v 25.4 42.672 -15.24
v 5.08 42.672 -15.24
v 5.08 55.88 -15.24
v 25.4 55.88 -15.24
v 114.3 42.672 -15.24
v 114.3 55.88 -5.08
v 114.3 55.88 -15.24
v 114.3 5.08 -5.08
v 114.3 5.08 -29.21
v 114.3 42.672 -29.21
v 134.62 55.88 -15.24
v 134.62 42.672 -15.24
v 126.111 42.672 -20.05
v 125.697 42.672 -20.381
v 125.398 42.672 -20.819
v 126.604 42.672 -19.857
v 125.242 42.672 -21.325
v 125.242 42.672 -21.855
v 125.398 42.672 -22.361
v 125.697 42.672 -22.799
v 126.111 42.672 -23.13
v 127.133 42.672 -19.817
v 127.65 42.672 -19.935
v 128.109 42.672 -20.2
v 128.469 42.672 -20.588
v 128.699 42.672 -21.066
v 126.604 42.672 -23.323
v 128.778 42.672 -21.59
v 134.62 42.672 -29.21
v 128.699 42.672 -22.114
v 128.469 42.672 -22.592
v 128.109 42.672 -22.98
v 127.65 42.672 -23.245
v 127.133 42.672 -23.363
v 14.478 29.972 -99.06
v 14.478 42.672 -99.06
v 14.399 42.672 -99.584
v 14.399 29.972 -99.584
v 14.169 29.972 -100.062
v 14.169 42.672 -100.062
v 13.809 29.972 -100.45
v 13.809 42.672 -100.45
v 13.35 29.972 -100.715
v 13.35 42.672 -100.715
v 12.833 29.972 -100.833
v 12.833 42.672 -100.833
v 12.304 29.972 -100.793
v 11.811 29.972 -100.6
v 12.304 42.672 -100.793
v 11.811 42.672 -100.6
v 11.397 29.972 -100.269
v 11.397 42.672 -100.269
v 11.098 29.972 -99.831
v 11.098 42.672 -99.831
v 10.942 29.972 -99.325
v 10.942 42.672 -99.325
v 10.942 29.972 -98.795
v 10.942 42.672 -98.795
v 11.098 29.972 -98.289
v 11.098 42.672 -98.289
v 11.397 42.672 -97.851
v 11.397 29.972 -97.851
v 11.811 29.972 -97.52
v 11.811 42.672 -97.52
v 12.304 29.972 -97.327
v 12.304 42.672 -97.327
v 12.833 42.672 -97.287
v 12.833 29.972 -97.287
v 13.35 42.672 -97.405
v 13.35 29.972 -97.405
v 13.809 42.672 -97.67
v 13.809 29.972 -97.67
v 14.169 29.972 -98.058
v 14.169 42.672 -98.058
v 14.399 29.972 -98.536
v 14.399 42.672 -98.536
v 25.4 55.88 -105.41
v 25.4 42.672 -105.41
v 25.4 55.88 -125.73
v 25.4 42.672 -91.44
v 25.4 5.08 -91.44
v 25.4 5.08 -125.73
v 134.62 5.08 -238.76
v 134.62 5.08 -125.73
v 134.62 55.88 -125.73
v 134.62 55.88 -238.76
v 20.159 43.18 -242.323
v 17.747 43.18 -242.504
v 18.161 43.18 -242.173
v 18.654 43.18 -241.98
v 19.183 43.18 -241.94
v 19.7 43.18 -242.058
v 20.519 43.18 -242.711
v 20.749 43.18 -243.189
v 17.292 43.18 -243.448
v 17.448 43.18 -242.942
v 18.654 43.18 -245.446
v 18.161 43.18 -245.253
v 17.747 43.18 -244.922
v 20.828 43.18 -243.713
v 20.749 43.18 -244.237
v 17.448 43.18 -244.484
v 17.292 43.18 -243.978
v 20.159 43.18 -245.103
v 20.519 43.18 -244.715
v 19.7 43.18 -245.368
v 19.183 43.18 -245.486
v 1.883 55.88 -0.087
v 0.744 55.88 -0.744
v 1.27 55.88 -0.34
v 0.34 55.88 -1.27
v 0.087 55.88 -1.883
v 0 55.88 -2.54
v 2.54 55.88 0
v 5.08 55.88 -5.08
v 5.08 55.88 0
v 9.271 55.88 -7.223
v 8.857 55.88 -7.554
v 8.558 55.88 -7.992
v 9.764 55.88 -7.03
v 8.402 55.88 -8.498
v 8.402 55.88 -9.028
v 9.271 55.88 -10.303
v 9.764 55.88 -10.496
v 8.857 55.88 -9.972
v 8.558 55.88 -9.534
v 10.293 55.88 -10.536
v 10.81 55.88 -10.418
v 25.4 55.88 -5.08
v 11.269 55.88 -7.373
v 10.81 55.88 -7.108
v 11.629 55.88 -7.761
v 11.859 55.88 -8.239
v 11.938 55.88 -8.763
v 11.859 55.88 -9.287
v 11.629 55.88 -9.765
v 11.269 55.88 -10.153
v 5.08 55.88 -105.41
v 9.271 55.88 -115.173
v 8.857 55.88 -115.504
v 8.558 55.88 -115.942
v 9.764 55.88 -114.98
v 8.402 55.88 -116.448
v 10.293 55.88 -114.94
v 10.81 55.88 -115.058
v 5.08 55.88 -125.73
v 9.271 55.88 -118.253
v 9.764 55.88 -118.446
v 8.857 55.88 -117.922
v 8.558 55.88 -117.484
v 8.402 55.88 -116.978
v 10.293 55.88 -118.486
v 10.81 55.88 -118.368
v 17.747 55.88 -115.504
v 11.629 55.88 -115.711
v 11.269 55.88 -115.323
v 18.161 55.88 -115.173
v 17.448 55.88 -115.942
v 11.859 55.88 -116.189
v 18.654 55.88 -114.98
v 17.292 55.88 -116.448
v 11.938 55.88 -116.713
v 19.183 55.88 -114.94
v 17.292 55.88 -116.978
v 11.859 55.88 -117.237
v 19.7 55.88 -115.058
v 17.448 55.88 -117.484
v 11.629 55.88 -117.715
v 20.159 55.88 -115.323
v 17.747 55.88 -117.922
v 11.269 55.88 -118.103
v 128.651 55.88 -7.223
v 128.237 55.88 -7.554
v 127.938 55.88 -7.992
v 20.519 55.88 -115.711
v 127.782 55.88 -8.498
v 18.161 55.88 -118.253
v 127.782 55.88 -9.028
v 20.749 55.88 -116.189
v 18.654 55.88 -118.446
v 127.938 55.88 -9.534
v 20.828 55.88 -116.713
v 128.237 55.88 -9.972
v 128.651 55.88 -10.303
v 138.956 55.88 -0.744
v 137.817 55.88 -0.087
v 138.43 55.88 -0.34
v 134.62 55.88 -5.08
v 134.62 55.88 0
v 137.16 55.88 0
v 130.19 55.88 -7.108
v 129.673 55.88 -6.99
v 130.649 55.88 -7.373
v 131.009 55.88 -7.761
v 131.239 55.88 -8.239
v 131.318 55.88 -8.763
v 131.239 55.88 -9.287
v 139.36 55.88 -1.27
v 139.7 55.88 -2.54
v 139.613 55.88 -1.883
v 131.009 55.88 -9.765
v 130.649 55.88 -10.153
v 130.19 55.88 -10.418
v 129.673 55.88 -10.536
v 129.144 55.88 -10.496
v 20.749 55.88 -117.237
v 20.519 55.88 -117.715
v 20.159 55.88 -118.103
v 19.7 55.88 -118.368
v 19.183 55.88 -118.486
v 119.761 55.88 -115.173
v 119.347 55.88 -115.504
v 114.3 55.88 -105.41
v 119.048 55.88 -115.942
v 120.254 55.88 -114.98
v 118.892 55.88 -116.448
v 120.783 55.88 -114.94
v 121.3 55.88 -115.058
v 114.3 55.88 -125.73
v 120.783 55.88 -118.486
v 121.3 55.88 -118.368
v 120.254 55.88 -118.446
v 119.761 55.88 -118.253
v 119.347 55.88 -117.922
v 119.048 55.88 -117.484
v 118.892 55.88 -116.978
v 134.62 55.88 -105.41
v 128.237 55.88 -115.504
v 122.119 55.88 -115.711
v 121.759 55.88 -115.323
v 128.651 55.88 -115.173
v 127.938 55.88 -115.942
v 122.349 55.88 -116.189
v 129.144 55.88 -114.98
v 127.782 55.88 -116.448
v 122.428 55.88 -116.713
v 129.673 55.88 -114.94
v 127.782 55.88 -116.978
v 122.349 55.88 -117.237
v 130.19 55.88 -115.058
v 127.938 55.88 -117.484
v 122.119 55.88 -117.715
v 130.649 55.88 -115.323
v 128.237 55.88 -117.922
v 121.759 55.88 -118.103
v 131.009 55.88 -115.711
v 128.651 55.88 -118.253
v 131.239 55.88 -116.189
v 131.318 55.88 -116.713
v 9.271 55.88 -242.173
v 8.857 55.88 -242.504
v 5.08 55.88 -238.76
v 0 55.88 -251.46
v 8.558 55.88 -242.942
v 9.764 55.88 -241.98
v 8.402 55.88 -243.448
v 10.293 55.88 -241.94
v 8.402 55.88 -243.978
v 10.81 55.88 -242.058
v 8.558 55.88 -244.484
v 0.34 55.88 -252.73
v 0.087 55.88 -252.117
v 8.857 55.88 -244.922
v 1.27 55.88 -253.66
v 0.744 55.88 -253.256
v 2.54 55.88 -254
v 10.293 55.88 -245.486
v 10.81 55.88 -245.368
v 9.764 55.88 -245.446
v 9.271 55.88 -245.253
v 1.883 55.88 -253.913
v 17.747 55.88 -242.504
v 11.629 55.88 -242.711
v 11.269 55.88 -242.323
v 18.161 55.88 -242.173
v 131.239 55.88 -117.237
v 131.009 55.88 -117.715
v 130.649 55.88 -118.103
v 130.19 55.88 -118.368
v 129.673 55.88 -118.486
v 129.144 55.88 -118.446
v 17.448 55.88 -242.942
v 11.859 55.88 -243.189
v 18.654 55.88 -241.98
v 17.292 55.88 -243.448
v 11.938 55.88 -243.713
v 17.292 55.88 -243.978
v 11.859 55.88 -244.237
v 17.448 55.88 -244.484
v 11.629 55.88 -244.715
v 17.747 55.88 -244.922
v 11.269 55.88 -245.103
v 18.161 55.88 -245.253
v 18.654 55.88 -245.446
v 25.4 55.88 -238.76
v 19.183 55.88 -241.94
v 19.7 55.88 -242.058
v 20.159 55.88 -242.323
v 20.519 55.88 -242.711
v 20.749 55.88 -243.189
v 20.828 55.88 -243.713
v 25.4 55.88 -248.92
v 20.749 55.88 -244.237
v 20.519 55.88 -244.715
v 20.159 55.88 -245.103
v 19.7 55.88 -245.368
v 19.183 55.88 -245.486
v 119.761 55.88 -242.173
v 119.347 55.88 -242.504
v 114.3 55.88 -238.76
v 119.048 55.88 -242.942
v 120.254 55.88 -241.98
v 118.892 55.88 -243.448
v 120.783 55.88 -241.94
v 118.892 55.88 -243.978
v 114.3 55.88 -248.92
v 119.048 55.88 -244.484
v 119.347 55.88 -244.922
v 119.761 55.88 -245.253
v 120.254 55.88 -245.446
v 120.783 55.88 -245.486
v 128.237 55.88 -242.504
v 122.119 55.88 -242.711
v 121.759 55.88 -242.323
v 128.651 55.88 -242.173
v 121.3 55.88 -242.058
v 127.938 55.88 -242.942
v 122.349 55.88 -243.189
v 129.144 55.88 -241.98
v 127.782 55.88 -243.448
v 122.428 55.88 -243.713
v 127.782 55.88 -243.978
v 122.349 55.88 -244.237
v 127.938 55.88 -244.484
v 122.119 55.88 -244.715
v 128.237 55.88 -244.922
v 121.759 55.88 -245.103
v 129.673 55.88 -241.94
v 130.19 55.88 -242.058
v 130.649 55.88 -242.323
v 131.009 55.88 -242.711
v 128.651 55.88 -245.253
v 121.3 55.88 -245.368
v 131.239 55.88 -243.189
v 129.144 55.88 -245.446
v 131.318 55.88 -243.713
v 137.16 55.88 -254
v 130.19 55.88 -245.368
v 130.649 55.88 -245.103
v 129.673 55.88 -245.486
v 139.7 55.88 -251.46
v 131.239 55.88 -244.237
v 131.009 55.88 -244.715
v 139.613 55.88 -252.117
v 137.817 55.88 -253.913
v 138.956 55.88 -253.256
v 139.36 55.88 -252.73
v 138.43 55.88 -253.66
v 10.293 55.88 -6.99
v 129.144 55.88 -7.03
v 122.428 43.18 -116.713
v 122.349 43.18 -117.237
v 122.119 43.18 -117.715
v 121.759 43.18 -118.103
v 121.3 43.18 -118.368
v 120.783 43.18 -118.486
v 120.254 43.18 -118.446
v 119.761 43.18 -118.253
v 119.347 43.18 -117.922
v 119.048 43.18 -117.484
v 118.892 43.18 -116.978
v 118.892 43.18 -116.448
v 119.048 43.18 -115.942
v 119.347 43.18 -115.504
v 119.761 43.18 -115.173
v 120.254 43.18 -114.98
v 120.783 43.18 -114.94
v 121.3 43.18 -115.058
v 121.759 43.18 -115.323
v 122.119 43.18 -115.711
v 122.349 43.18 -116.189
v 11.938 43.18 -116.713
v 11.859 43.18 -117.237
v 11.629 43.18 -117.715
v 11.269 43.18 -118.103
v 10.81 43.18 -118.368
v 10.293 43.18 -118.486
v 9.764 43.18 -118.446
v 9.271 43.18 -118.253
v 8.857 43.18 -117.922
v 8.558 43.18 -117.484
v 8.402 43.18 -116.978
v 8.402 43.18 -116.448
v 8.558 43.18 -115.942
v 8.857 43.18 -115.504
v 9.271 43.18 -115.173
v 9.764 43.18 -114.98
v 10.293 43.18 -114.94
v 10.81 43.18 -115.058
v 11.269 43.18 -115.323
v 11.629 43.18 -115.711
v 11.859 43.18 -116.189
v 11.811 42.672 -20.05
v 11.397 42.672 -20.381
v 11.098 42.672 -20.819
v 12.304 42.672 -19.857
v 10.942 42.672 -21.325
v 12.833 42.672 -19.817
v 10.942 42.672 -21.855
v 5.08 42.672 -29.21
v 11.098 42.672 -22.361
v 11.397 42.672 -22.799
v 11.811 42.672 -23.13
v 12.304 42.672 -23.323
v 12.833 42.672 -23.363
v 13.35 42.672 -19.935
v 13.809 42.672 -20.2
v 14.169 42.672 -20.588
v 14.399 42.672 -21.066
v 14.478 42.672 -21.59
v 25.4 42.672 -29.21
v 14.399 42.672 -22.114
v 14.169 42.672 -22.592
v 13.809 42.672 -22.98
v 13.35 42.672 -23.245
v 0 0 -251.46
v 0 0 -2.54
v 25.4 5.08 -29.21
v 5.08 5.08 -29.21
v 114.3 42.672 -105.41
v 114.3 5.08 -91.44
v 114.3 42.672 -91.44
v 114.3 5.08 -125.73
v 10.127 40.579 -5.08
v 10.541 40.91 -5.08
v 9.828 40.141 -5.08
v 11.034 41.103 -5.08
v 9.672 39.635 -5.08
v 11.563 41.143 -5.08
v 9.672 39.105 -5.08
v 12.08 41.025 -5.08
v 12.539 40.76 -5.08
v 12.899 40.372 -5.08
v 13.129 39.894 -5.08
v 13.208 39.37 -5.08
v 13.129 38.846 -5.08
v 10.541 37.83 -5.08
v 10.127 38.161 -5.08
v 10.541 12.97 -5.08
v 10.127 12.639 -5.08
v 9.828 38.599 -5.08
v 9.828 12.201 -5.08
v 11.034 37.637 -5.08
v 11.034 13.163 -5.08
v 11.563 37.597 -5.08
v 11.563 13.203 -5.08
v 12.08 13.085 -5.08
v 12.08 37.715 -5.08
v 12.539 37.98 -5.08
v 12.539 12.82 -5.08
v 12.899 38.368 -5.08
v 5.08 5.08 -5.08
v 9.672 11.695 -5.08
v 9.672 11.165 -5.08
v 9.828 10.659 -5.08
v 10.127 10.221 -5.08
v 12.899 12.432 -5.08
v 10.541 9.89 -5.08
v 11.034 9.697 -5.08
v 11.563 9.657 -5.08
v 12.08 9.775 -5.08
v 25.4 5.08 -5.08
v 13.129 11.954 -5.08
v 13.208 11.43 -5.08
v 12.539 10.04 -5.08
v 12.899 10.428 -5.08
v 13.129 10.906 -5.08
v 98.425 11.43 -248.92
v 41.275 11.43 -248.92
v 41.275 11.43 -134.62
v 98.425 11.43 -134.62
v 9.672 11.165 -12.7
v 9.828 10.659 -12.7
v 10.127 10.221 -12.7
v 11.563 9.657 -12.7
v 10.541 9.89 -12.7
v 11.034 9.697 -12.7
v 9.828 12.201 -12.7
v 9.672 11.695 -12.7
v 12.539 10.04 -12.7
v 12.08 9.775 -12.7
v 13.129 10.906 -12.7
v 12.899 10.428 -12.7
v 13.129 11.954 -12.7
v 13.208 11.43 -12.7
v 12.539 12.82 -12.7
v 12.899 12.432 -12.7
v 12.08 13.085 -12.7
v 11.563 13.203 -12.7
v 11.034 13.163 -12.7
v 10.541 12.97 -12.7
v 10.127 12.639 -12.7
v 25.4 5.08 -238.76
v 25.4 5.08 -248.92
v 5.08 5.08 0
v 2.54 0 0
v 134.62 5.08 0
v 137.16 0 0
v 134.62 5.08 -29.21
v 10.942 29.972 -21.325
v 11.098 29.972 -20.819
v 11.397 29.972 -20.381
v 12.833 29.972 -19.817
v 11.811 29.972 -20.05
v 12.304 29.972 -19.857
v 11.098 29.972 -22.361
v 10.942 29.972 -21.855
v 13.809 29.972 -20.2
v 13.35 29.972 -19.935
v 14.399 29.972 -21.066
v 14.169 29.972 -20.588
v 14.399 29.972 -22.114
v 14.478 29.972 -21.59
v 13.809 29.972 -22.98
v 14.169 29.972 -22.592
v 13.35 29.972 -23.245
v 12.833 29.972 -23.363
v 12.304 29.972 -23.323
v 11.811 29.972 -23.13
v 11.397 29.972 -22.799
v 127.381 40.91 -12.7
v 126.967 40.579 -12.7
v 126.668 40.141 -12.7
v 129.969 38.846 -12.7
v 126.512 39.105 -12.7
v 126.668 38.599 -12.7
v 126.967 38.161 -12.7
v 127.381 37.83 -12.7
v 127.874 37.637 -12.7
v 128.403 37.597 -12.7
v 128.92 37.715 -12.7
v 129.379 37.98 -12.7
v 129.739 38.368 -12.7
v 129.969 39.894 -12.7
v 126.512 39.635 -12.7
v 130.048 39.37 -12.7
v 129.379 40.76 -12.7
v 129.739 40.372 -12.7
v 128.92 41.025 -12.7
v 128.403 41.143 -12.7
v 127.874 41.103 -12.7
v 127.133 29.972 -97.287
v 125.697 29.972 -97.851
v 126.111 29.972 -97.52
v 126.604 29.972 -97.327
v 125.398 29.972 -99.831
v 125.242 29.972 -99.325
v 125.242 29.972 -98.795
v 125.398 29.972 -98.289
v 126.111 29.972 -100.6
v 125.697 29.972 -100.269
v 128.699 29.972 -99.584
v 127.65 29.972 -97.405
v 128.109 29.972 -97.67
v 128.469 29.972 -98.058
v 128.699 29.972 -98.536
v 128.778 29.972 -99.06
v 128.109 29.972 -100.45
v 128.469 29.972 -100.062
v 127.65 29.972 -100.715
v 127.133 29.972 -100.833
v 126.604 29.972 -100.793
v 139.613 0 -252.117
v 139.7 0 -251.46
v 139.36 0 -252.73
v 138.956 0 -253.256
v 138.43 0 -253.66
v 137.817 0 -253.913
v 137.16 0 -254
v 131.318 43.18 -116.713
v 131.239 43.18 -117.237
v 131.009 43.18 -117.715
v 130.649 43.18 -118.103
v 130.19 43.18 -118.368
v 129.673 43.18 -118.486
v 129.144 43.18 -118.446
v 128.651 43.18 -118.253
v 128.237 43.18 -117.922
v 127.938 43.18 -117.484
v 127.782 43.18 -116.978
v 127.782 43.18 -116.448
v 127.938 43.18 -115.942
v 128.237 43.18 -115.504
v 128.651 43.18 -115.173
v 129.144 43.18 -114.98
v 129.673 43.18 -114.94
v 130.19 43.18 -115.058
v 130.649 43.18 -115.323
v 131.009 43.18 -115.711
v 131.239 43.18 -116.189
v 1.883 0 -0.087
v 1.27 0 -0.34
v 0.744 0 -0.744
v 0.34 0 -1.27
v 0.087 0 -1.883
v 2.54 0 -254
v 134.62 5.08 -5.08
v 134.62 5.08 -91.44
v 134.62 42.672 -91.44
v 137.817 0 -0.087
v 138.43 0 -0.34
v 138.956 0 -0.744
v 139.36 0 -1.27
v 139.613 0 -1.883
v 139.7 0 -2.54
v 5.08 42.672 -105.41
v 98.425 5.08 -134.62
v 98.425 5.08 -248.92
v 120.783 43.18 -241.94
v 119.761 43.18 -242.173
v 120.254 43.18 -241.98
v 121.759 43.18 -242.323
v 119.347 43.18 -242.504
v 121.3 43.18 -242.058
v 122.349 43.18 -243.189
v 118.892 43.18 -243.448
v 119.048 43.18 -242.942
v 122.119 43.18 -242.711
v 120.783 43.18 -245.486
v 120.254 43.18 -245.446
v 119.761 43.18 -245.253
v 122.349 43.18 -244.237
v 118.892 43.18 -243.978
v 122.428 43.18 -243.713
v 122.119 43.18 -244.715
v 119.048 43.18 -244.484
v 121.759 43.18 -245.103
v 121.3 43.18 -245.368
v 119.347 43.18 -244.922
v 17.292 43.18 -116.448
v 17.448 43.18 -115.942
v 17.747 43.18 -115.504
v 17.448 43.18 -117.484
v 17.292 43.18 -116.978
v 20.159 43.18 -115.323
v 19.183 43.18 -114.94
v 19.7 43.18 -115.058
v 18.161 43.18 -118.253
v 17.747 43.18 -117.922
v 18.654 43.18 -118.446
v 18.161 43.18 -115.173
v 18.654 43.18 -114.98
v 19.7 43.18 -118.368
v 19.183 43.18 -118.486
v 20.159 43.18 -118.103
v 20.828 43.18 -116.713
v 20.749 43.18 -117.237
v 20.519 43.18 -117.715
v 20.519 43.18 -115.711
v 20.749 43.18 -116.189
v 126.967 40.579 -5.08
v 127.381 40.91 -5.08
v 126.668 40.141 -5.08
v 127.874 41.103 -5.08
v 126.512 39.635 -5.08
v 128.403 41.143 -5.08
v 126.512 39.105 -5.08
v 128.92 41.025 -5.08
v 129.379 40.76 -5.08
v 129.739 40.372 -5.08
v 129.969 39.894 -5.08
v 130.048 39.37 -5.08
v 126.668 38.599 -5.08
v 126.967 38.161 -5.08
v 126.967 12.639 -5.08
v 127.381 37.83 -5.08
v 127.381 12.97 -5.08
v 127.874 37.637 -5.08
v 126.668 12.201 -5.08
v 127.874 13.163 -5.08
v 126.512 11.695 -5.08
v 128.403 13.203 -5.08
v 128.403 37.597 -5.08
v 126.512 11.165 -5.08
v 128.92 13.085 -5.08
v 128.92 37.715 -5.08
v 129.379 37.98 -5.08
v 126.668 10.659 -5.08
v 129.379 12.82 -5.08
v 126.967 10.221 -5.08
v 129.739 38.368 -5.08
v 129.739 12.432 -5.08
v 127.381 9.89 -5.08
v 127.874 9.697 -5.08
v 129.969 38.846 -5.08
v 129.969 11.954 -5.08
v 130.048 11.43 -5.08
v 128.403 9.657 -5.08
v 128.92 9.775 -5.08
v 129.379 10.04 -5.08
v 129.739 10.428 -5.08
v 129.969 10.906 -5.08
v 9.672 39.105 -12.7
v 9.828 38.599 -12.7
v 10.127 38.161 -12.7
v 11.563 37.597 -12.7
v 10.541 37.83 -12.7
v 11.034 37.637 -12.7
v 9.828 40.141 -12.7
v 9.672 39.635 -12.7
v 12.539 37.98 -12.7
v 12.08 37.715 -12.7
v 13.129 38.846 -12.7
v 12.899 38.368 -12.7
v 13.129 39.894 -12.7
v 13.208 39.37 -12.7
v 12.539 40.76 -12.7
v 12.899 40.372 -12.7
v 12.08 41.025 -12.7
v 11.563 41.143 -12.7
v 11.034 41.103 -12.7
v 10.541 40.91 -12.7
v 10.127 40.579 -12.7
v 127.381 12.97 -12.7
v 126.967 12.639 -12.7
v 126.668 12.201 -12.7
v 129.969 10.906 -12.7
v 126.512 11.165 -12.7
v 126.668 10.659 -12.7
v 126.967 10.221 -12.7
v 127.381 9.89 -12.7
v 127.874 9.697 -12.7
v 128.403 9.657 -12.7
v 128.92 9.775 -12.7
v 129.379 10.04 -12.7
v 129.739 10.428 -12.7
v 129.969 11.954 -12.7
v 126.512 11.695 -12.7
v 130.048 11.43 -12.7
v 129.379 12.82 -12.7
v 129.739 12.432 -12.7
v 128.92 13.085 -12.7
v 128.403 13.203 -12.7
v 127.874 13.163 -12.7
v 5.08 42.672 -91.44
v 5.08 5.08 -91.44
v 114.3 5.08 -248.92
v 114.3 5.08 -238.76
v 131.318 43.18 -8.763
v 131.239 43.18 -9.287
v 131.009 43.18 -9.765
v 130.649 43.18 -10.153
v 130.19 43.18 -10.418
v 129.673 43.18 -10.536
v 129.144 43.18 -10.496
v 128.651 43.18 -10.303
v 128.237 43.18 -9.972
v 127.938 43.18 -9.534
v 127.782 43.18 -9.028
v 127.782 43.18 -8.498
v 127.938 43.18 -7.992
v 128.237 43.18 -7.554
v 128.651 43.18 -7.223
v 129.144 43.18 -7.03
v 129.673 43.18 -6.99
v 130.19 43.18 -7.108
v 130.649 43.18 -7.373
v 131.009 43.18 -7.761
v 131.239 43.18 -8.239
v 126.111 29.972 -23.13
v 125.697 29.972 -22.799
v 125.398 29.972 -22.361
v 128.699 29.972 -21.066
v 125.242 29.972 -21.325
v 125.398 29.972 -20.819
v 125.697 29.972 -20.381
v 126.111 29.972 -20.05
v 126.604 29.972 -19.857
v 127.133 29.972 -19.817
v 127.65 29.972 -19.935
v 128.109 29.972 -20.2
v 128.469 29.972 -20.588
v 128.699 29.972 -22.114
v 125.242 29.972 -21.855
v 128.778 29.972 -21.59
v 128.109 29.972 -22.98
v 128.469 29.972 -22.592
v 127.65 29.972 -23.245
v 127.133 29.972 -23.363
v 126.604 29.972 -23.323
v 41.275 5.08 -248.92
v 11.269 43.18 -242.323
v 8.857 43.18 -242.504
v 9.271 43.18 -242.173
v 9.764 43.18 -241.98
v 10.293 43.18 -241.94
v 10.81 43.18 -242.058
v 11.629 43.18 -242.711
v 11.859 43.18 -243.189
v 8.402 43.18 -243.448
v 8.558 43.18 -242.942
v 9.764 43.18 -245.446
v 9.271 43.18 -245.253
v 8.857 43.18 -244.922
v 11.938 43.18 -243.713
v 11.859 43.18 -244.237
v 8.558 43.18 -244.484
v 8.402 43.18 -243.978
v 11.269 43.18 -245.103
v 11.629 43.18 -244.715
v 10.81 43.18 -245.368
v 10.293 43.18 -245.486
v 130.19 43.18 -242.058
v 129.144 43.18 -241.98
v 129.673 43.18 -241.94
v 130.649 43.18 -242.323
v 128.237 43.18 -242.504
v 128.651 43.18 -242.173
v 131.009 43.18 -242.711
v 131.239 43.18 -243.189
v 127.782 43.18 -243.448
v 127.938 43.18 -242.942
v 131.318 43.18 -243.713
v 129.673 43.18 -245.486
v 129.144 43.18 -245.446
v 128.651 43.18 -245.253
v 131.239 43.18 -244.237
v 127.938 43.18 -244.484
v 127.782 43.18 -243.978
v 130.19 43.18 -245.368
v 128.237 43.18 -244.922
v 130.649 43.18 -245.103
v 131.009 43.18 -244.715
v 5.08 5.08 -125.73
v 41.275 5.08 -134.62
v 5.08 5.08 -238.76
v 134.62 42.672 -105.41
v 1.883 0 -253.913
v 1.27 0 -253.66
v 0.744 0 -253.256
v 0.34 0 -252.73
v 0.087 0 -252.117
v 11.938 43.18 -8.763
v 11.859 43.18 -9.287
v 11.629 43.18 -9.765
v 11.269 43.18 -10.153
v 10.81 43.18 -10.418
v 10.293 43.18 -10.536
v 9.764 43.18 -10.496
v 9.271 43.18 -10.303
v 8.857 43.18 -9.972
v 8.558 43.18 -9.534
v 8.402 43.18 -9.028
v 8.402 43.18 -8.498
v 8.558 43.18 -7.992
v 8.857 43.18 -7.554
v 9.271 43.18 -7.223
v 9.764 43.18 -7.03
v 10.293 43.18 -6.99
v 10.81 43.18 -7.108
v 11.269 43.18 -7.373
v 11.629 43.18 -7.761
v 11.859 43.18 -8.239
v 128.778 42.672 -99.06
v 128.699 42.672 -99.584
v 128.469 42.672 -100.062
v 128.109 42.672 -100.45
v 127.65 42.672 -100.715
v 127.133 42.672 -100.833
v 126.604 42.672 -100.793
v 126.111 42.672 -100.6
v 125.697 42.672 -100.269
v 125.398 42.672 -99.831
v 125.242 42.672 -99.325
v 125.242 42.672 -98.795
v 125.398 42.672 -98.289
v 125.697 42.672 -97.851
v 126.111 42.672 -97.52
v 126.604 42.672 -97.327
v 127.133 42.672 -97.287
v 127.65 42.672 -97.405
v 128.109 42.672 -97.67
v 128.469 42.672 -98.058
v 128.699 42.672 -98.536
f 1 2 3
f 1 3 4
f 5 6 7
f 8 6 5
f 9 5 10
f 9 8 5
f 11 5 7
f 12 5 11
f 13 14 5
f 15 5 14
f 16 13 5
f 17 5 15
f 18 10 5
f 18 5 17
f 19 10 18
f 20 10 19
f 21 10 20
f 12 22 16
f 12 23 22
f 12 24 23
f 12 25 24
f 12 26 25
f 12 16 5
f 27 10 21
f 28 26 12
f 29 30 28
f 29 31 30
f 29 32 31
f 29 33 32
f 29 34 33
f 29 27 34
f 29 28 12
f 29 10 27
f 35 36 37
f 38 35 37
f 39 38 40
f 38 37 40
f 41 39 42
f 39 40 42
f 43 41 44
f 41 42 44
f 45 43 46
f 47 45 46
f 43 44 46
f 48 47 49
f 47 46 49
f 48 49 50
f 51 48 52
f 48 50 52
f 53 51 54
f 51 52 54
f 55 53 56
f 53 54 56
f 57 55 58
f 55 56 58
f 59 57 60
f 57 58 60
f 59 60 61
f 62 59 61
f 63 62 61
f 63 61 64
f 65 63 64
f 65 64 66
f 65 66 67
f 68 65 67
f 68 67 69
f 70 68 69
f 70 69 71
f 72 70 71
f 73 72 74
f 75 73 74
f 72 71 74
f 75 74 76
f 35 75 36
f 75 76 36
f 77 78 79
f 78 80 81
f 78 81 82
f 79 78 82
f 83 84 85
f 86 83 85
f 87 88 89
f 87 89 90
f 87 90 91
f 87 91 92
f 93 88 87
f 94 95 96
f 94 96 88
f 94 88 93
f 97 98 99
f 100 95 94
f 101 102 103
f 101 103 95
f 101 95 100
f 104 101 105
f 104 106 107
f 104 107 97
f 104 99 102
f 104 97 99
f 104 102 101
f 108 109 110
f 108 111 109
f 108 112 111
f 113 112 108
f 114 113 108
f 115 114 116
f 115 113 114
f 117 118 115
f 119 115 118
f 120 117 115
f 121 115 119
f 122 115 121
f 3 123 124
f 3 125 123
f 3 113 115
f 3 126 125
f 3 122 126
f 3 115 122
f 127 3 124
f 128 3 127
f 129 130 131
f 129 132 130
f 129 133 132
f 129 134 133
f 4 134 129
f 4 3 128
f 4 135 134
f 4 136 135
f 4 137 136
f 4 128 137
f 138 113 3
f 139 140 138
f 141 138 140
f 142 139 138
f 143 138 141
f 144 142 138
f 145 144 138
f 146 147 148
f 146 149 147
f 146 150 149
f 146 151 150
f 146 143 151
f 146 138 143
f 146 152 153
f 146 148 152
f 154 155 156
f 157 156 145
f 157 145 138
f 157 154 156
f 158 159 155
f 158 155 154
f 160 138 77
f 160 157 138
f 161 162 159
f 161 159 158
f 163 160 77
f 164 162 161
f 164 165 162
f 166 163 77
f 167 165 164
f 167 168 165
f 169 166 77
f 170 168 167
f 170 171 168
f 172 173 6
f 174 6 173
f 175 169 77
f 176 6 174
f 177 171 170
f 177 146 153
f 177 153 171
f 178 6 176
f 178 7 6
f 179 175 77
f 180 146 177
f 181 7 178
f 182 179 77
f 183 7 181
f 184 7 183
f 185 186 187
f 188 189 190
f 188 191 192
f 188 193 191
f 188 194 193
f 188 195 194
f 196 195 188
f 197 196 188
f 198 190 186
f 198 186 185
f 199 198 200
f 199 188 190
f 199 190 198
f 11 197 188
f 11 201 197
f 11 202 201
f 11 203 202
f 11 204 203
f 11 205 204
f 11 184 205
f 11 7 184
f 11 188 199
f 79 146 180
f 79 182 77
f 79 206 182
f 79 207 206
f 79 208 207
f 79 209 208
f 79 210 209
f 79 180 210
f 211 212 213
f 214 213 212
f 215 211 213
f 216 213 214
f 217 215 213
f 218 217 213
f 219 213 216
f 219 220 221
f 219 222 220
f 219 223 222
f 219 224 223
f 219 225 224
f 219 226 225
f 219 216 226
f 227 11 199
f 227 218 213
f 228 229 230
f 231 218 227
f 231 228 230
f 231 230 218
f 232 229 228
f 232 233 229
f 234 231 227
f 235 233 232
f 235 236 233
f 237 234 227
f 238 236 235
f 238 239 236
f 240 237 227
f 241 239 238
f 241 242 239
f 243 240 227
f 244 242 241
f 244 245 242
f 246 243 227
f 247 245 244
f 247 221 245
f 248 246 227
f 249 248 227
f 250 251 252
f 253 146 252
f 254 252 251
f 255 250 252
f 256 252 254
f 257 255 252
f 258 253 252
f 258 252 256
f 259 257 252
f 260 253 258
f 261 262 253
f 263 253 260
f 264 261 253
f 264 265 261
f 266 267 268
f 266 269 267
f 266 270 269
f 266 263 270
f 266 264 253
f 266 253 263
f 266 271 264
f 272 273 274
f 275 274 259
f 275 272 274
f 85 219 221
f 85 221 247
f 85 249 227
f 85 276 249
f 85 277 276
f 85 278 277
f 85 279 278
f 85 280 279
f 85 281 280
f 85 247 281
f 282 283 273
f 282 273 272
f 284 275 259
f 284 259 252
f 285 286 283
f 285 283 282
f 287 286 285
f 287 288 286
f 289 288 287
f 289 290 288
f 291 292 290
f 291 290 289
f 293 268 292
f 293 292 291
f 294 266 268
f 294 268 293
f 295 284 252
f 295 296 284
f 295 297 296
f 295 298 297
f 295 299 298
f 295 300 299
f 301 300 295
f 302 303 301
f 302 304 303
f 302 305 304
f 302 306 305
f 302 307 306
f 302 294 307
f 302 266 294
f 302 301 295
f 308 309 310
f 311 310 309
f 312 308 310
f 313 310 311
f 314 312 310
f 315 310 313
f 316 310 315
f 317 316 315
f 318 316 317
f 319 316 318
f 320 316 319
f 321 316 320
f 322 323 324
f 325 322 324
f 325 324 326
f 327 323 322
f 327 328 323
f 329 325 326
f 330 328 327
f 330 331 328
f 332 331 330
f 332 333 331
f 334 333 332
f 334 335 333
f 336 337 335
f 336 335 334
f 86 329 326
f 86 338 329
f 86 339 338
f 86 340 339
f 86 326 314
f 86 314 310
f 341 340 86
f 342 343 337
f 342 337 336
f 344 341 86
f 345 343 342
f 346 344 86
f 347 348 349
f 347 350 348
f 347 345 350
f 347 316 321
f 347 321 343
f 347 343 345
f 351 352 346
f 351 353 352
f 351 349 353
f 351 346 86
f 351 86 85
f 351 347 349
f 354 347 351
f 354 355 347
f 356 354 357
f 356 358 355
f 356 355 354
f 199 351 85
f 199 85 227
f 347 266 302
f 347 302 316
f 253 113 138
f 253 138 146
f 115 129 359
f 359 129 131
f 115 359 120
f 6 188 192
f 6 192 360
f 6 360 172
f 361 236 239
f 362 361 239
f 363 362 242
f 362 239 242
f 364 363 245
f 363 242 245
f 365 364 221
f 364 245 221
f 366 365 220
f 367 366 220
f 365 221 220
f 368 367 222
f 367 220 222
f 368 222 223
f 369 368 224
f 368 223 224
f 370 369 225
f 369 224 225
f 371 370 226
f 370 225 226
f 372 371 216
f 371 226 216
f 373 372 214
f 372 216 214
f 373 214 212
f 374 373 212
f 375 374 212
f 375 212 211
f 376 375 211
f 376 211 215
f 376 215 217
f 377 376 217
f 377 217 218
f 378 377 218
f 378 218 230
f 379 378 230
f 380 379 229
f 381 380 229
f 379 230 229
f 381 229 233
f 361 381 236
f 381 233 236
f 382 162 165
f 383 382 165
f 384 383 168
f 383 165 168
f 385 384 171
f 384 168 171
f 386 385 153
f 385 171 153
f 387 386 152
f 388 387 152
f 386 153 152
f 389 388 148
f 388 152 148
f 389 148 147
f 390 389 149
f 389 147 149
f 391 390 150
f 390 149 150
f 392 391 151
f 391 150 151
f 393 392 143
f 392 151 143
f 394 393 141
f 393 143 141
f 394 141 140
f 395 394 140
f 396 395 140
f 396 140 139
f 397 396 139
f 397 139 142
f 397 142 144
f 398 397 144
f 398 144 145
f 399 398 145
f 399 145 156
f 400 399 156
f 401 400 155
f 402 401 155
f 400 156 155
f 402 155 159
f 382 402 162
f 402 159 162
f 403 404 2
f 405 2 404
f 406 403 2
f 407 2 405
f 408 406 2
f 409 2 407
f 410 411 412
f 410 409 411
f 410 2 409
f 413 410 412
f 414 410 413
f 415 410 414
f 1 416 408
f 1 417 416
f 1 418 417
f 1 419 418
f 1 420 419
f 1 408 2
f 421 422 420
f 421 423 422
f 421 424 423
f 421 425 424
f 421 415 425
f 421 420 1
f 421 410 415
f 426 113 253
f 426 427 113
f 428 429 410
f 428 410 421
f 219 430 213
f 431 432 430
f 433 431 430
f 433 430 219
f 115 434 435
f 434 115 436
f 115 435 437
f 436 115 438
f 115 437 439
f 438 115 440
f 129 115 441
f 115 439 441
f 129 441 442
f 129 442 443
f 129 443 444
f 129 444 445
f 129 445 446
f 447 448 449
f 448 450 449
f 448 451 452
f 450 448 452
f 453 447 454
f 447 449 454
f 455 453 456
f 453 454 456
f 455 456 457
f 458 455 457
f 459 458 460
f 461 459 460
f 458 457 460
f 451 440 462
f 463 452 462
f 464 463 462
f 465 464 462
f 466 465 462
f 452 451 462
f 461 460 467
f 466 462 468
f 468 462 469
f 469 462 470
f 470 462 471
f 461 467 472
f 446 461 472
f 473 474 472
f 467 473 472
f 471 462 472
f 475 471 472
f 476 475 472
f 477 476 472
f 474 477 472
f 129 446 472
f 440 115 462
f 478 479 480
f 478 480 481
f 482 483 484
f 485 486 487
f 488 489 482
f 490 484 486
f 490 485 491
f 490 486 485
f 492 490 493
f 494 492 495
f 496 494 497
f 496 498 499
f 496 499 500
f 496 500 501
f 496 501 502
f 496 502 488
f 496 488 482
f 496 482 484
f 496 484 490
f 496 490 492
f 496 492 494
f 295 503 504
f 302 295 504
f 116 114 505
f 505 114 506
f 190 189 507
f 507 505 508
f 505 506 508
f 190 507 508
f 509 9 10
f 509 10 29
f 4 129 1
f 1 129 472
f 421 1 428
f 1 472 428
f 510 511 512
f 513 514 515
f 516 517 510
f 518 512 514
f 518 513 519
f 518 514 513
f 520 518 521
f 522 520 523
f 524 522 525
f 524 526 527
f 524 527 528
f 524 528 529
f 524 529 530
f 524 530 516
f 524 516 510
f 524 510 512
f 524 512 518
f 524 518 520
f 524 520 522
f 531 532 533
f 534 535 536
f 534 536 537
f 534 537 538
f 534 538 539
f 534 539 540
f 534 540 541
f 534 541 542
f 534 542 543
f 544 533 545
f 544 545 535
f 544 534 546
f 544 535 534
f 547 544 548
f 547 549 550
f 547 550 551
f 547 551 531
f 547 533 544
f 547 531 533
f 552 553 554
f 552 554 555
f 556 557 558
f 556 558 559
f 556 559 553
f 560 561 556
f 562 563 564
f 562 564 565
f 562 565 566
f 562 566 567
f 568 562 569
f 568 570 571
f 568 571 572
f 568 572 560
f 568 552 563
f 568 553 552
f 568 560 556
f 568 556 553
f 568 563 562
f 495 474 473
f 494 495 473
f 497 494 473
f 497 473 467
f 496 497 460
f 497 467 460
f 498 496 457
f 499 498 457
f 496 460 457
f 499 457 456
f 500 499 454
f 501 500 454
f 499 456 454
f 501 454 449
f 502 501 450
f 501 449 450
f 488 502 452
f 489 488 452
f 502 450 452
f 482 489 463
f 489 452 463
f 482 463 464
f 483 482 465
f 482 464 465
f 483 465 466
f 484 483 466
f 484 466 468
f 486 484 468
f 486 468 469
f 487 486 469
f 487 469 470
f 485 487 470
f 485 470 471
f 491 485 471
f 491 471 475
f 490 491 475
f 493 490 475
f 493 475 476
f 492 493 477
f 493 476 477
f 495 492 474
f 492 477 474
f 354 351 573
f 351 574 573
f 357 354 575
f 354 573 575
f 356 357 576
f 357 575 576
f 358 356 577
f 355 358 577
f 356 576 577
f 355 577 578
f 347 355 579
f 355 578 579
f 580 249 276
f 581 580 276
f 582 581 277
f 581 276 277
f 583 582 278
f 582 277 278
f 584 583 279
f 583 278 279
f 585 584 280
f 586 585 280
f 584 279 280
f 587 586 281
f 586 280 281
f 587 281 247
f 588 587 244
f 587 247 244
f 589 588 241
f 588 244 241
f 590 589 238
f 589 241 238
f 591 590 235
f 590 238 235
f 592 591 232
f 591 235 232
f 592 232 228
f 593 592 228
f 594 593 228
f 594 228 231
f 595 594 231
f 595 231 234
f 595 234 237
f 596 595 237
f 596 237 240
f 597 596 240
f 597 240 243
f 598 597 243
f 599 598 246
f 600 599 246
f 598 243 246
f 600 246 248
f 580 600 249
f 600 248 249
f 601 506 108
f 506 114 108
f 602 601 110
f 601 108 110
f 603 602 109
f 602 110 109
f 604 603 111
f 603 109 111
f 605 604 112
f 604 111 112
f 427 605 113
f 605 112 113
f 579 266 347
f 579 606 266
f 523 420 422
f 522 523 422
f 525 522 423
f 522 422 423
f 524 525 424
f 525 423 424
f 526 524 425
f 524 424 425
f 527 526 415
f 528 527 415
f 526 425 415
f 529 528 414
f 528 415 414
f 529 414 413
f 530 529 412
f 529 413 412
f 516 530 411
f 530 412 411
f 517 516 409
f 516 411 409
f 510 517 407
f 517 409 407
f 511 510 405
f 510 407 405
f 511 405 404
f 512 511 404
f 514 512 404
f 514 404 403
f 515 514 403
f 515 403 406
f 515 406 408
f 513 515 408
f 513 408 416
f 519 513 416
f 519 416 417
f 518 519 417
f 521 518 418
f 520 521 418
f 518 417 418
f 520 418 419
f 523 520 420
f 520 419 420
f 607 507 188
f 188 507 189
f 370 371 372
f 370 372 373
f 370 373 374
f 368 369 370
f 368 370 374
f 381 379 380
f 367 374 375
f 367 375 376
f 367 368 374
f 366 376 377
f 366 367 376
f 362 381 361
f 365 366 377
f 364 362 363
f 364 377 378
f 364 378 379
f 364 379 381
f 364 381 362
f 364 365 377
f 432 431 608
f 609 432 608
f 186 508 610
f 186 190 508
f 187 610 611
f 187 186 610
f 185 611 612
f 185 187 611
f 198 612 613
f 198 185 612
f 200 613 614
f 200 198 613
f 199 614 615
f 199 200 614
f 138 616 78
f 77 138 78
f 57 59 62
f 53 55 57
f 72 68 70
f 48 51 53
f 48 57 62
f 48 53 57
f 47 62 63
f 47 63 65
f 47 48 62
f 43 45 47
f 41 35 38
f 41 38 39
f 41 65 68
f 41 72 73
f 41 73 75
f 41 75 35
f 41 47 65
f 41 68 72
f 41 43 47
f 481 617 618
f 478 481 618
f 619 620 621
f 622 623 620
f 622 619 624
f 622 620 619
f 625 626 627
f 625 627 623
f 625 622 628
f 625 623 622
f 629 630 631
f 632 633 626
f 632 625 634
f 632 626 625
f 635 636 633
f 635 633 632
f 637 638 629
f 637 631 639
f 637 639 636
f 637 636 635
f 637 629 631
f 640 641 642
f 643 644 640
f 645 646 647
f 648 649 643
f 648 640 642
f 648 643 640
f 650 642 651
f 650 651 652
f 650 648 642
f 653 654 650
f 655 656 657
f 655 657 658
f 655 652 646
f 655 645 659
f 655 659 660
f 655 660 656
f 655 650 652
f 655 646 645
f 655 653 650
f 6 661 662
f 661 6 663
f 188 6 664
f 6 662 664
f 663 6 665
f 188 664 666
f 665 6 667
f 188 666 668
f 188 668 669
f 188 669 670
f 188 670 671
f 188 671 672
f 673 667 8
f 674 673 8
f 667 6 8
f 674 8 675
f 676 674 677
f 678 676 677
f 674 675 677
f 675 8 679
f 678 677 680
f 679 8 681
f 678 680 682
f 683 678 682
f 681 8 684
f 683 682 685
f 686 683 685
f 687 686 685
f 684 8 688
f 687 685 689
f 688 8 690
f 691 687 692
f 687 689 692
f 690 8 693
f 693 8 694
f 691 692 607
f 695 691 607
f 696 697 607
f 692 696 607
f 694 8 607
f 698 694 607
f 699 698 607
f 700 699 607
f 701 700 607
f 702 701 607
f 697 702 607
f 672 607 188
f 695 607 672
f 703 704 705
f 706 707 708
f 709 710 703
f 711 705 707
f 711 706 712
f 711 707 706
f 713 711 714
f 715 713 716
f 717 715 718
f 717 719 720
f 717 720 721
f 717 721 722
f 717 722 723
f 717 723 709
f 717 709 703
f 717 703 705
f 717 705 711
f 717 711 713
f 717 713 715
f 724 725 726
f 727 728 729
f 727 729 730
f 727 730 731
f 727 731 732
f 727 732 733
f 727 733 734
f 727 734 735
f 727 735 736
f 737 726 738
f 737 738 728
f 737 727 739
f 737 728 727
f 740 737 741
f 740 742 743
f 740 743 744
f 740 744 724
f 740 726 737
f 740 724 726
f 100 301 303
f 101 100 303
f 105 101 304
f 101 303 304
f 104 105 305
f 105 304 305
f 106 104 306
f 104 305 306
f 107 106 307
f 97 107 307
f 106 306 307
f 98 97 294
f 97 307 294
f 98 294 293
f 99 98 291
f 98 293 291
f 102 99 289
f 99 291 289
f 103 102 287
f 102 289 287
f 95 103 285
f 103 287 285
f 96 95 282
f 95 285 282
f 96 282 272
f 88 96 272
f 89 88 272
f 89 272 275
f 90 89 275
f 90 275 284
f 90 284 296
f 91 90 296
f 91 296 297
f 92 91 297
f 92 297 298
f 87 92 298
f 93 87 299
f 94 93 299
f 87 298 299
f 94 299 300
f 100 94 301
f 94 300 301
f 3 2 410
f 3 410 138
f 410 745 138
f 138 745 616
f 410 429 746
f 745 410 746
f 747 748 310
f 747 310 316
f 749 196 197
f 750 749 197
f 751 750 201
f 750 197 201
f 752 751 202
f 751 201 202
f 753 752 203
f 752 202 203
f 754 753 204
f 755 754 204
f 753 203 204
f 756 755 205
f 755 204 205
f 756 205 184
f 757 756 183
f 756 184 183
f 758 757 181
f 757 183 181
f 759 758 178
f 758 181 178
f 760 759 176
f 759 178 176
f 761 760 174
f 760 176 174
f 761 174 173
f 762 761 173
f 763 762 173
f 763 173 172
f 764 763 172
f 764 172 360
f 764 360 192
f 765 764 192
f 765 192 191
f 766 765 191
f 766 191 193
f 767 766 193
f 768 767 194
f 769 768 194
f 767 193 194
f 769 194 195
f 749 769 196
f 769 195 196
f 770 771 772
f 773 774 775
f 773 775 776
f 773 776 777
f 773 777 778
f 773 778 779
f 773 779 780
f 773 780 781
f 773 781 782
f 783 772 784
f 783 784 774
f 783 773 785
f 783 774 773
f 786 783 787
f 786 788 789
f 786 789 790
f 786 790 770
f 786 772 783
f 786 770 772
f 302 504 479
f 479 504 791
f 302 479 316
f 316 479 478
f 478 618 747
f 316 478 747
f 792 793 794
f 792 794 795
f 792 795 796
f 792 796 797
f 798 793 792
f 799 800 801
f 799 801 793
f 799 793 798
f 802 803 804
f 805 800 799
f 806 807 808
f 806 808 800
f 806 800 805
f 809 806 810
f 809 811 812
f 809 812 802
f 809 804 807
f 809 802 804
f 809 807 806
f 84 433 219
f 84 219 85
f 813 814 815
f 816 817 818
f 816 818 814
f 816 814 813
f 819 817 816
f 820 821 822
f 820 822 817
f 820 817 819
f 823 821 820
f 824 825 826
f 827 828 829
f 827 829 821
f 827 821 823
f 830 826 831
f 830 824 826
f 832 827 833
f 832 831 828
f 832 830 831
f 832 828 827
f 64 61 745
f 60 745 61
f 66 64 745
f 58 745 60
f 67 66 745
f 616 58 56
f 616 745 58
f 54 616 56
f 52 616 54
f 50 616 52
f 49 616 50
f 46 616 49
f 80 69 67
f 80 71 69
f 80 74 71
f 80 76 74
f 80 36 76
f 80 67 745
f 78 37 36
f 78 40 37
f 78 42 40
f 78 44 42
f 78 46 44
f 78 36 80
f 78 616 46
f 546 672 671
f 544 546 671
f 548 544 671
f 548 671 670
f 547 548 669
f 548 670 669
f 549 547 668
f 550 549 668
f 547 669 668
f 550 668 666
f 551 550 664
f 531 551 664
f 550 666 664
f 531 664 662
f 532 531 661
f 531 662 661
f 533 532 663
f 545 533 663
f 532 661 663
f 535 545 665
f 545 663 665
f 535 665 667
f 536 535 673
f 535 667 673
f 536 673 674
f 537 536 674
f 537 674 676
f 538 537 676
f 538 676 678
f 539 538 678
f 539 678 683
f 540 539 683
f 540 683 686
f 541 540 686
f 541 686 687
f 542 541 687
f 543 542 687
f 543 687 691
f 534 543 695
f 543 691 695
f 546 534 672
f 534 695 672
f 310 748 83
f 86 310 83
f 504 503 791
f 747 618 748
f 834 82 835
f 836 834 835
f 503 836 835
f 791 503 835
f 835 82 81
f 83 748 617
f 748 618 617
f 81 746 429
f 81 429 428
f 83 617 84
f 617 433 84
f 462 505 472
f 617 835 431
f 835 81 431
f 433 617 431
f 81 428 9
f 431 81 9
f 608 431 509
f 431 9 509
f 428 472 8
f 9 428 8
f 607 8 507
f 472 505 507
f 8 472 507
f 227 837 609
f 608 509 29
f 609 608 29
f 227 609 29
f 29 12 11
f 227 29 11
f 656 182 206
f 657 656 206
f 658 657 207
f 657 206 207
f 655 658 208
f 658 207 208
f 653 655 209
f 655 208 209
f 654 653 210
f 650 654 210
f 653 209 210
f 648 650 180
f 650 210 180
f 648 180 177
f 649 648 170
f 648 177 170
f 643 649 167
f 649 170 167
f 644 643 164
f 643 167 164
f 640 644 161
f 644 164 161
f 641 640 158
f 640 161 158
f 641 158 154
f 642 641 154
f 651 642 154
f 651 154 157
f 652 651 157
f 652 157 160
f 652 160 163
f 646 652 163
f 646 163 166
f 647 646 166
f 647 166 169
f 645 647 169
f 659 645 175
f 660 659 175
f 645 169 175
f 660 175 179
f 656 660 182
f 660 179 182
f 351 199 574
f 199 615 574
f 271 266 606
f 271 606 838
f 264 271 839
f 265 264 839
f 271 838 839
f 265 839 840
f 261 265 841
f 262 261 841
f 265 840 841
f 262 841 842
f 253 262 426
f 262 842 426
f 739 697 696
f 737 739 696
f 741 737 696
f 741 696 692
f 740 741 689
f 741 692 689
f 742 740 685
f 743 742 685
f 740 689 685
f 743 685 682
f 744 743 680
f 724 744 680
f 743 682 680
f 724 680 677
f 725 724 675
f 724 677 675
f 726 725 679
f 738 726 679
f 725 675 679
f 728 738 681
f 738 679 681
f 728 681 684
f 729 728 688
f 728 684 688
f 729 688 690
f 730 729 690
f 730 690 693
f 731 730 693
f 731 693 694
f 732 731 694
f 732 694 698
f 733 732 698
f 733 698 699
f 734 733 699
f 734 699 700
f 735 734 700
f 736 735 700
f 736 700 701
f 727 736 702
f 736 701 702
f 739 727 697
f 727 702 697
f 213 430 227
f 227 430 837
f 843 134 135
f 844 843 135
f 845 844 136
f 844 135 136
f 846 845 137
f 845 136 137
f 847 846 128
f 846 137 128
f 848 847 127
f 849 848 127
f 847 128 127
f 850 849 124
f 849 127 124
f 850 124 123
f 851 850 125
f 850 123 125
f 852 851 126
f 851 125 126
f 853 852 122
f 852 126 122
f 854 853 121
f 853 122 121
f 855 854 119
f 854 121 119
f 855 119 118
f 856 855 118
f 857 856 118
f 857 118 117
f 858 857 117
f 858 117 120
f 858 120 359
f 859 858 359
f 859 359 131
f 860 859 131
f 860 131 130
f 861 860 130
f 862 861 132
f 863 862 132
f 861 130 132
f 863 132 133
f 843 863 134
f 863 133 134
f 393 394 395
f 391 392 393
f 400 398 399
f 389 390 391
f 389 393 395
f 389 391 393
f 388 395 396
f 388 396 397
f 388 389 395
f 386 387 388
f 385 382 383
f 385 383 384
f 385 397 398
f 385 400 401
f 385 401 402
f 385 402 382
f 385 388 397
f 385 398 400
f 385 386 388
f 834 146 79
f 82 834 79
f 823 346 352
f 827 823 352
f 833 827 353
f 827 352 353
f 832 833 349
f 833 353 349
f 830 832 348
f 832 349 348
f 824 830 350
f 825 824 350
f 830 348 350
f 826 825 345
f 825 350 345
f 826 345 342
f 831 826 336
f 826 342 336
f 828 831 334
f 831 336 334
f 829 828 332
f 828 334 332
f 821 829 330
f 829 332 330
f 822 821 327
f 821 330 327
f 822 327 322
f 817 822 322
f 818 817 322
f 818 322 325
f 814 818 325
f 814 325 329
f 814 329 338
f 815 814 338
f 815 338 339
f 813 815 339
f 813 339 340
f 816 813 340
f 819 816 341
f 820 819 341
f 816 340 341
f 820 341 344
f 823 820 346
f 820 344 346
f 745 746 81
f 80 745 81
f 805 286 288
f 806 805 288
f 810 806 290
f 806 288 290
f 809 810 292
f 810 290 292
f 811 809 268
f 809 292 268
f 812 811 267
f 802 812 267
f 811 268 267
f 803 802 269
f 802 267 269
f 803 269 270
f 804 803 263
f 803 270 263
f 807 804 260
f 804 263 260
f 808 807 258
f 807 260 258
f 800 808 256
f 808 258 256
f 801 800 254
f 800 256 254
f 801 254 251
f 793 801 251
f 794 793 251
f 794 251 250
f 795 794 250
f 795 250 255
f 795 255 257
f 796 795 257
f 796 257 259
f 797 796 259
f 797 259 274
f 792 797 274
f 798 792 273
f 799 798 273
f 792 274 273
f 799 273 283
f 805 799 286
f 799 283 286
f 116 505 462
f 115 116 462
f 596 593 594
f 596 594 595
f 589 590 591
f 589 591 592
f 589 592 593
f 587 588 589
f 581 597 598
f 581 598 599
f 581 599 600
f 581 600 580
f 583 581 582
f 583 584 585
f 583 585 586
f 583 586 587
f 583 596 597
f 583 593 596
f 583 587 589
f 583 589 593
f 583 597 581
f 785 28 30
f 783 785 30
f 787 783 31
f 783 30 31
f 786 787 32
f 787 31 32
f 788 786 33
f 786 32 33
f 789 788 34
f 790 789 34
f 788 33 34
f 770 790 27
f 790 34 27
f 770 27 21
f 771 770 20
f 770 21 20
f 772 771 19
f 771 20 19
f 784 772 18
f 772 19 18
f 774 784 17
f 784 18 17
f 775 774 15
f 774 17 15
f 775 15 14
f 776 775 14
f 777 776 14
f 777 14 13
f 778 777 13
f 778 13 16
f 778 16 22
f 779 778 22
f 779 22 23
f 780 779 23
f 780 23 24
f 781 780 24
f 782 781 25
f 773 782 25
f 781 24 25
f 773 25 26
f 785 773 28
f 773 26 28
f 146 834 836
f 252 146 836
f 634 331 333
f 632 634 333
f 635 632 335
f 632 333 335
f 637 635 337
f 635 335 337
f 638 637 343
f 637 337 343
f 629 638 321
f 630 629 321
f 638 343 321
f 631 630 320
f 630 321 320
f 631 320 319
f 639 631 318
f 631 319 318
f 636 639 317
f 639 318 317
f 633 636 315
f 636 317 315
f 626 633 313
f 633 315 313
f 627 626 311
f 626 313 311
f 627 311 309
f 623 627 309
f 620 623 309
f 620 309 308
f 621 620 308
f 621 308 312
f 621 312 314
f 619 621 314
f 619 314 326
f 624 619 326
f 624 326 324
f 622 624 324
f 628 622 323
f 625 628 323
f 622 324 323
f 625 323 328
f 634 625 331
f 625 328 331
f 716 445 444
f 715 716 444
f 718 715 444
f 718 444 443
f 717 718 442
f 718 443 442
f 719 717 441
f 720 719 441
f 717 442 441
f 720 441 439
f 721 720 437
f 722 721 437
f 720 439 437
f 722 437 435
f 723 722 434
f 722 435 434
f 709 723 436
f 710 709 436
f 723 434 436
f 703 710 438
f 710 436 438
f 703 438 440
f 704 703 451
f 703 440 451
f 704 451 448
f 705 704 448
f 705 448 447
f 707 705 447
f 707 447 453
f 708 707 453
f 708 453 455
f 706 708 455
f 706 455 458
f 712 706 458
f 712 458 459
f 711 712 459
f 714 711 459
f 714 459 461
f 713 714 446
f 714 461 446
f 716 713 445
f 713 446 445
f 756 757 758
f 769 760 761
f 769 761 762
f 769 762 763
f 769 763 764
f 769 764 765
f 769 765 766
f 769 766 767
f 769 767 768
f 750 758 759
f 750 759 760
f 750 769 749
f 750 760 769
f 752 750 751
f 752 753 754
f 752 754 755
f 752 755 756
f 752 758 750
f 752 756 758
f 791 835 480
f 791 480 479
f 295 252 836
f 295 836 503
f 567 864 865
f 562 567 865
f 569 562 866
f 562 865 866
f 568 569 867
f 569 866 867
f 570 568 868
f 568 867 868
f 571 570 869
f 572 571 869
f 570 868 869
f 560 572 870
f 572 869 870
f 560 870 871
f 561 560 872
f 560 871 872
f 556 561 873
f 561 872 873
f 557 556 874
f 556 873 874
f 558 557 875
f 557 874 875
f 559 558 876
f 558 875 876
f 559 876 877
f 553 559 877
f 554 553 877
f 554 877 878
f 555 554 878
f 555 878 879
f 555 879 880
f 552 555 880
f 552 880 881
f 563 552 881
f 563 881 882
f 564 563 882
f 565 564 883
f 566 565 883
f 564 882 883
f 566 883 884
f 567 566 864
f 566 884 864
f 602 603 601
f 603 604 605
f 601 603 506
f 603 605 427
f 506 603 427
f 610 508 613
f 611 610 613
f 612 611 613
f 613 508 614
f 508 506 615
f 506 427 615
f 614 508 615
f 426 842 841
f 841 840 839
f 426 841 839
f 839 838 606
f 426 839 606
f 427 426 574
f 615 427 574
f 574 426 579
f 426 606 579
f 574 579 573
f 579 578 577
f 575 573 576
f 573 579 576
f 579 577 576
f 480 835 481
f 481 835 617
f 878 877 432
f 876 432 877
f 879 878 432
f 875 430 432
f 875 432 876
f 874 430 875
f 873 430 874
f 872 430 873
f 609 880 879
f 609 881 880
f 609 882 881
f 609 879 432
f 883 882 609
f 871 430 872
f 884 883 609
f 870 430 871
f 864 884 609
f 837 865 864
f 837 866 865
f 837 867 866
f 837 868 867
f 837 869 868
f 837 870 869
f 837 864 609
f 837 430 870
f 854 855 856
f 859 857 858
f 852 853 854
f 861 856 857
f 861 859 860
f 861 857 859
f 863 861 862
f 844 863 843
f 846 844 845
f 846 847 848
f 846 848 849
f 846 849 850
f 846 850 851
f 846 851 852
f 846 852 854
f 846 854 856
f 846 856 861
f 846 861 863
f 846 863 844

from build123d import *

# Parameters (mm, degrees)
SKETCH1_W                  = 139.7
SKETCH1_H                  = 254
BASE_DEPTH                 = 5.08
SKETCH2_W                  = 139.7
SKETCH2_H                  = 254
SKETCH2_W_2                = 129.54
SKETCH2_H_2                = 243.84
WALLS_DEPTH                = 50.8
SKETCH4_W                  = 129.54
SKETCH4_H                  = 50.8
BOTTOM_CUT_DEPTH           = 139.7
SKETCH12_W                 = 20.32
SKETCH12_H                 = 10.16
SKETCH12_H_2               = 20.32
MOUNTING_STRUTS_DEPTH      = 50.8
SKETCH13_R                 = 1.778
PANEL_MOUNTING_HOLES_DEPTH = 12.7
BOSS_EXTRUDE6_START        = -48.768
SKETCH14_W                 = 20.32
SKETCH14_H                 = 10.16
BOSS_EXTRUDE6_DEPTH        = 50.8
SKETCH17_R                 = 1.778
FRONT_MOUNTING_HOLES_DEPTH = 12.7
CORNER_FILLET_R            = 2.54
SKETCH18_W                 = 20.32
SKETCH18_H                 = 13.97
INSERT_MOUNT_DEPTH         = 37.592
SKETCH19_R                 = 1.778
CUT_EXTRUDE1_DEPTH         = 12.7
SKETCH20_W                 = 57.15
SKETCH20_H                 = 114.3
ARDUINO_MOUNT_DEPTH        = 6.35
SKETCH21_R                 = 1.778
CUT_EXTRUDE2_DEPTH         = 7.62


with BuildPart() as part:
    # Sketch1 → Base (new body)
    with BuildSketch(Plane(origin=(0, 0, 0), x_dir=(1, 0, 0), z_dir=(0, 1, 0))):
        with Locations((69.85, 127)):
            Rectangle(SKETCH1_W, SKETCH1_H)
    extrude(amount=BASE_DEPTH)

    # Sketch2 → Walls (add)
    with BuildSketch(Plane(origin=(0, 5.08, 0), x_dir=(1, 0, 0), z_dir=(0, 1, 0))):
        with Locations((69.85, 127)):
            Rectangle(SKETCH2_W, SKETCH2_H)
        with Locations((69.85, 127)):
            Rectangle(SKETCH2_W_2, SKETCH2_H_2, mode=Mode.SUBTRACT)
    extrude(amount=WALLS_DEPTH)

    # Sketch4 → Bottom Cut (cut)
    with BuildSketch(Plane.XY):
        with Locations((69.85, 30.48)):
            Rectangle(SKETCH4_W, SKETCH4_H)
    extrude(amount=-BOTTOM_CUT_DEPTH, mode=Mode.SUBTRACT)

    # Sketch12 → Mounting Struts (add)
    with BuildSketch(Plane(origin=(0, 5.08, 0), x_dir=(1, 0, 0), z_dir=(0, 1, 0))):
        with Locations((124.46, 243.84)):
            Rectangle(SKETCH12_W, SKETCH12_H)
        with Locations((15.24, 243.84)):
            Rectangle(SKETCH12_W, SKETCH12_H)
        with Locations((124.46, 115.57)):
            Rectangle(SKETCH12_W, SKETCH12_H_2)
        with Locations((15.24, 115.57)):
            Rectangle(SKETCH12_W, SKETCH12_H_2)
    extrude(amount=MOUNTING_STRUTS_DEPTH)

    # Sketch13 → Panel Mounting Holes (cut)
    with BuildSketch(Plane(origin=(0, 55.88, 0), x_dir=(1, 0, 0), z_dir=(0, 1, 0))):
        with Locations((120.65, 243.713)):
            Circle(SKETCH13_R)
        with Locations((19.05, 243.713)):
            Circle(SKETCH13_R)
        with Locations((120.65, 116.713)):
            Circle(SKETCH13_R)
        with Locations((19.05, 116.713)):
            Circle(SKETCH13_R)
    extrude(amount=-PANEL_MOUNTING_HOLES_DEPTH, mode=Mode.SUBTRACT)

    # Sketch14 → Boss-Extrude6 (add)
    with BuildSketch(Plane(origin=(0, 53.848, 0), x_dir=(1, 0, 0), z_dir=(0, 1, 0)).offset(BOSS_EXTRUDE6_START)):
        with Locations((124.46, 10.16)):
            Rectangle(SKETCH14_W, SKETCH14_H)
        with Locations((15.24, 10.16)):
            Rectangle(SKETCH14_W, SKETCH14_H)
    extrude(amount=BOSS_EXTRUDE6_DEPTH)

    # Sketch17 → Front Mounting Holes (cut)
    with BuildSketch(Plane(origin=(0, 55.88, 0), x_dir=(1, 0, 0), z_dir=(0, 1, 0))):
        with Locations((129.54, 243.713)):
            Circle(SKETCH17_R)
        with Locations((10.16, 243.713)):
            Circle(SKETCH17_R)
        with Locations((10.16, 116.713)):
            Circle(SKETCH17_R)
        with Locations((129.54, 116.713)):
            Circle(SKETCH17_R)
        with Locations((129.54, 8.763)):
            Circle(SKETCH17_R)
        with Locations((10.16, 8.763)):
            Circle(SKETCH17_R)
    extrude(amount=-FRONT_MOUNTING_HOLES_DEPTH, mode=Mode.SUBTRACT)

    # Corner Fillet
    corner_fillet_edges = [part.edges().sort_by_distance(p)[0] for p in [
        (0, 27.94, -254),
        (139.7, 27.94, -254),
        (139.7, 27.94, 0),
        (0, 27.94, 0),
    ]]
    fillet(corner_fillet_edges, radius=CORNER_FILLET_R)

    # Sketch18 → Insert Mount (add)
    with BuildSketch(Plane(origin=(0, 5.08, 0), x_dir=(1, 0, 0), z_dir=(0, 1, 0))):
        with Locations((15.24, 98.425)):
            Rectangle(SKETCH18_W, SKETCH18_H)
        with Locations((124.46, 98.425)):
            Rectangle(SKETCH18_W, SKETCH18_H)
        with Locations((124.46, 22.225)):
            Rectangle(SKETCH18_W, SKETCH18_H)
        with Locations((15.24, 22.225)):
            Rectangle(SKETCH18_W, SKETCH18_H)
    extrude(amount=INSERT_MOUNT_DEPTH)

    # Sketch19 → Cut-Extrude1 (cut)
    with BuildSketch(Plane(origin=(0, 42.672, 0), x_dir=(1, 0, 0), z_dir=(0, 1, 0))):
        with Locations((12.7, 99.06)):
            Circle(SKETCH19_R)
        with Locations((127, 99.06)):
            Circle(SKETCH19_R)
        with Locations((127, 21.59)):
            Circle(SKETCH19_R)
        with Locations((12.7, 21.59)):
            Circle(SKETCH19_R)
    extrude(amount=-CUT_EXTRUDE1_DEPTH, mode=Mode.SUBTRACT)

    # Sketch20 → Arduino Mount (add)
    with BuildSketch(Plane(origin=(0, 5.08, 0), x_dir=(1, 0, 0), z_dir=(0, 1, 0))):
        with Locations((69.85, 191.77)):
            Rectangle(SKETCH20_W, SKETCH20_H)
    extrude(amount=ARDUINO_MOUNT_DEPTH)

    # Sketch21 → Cut-Extrude2 (cut)
    with BuildSketch(Plane.XY.offset(-5.08)):
        with Locations((128.27, 11.43)):
            Circle(SKETCH21_R)
        with Locations((128.27, 39.37)):
            Circle(SKETCH21_R)
        with Locations((11.43, 39.37)):
            Circle(SKETCH21_R)
        with Locations((11.43, 11.43)):
            Circle(SKETCH21_R)
    extrude(amount=-CUT_EXTRUDE2_DEPTH, mode=Mode.SUBTRACT)


solid = part.part
